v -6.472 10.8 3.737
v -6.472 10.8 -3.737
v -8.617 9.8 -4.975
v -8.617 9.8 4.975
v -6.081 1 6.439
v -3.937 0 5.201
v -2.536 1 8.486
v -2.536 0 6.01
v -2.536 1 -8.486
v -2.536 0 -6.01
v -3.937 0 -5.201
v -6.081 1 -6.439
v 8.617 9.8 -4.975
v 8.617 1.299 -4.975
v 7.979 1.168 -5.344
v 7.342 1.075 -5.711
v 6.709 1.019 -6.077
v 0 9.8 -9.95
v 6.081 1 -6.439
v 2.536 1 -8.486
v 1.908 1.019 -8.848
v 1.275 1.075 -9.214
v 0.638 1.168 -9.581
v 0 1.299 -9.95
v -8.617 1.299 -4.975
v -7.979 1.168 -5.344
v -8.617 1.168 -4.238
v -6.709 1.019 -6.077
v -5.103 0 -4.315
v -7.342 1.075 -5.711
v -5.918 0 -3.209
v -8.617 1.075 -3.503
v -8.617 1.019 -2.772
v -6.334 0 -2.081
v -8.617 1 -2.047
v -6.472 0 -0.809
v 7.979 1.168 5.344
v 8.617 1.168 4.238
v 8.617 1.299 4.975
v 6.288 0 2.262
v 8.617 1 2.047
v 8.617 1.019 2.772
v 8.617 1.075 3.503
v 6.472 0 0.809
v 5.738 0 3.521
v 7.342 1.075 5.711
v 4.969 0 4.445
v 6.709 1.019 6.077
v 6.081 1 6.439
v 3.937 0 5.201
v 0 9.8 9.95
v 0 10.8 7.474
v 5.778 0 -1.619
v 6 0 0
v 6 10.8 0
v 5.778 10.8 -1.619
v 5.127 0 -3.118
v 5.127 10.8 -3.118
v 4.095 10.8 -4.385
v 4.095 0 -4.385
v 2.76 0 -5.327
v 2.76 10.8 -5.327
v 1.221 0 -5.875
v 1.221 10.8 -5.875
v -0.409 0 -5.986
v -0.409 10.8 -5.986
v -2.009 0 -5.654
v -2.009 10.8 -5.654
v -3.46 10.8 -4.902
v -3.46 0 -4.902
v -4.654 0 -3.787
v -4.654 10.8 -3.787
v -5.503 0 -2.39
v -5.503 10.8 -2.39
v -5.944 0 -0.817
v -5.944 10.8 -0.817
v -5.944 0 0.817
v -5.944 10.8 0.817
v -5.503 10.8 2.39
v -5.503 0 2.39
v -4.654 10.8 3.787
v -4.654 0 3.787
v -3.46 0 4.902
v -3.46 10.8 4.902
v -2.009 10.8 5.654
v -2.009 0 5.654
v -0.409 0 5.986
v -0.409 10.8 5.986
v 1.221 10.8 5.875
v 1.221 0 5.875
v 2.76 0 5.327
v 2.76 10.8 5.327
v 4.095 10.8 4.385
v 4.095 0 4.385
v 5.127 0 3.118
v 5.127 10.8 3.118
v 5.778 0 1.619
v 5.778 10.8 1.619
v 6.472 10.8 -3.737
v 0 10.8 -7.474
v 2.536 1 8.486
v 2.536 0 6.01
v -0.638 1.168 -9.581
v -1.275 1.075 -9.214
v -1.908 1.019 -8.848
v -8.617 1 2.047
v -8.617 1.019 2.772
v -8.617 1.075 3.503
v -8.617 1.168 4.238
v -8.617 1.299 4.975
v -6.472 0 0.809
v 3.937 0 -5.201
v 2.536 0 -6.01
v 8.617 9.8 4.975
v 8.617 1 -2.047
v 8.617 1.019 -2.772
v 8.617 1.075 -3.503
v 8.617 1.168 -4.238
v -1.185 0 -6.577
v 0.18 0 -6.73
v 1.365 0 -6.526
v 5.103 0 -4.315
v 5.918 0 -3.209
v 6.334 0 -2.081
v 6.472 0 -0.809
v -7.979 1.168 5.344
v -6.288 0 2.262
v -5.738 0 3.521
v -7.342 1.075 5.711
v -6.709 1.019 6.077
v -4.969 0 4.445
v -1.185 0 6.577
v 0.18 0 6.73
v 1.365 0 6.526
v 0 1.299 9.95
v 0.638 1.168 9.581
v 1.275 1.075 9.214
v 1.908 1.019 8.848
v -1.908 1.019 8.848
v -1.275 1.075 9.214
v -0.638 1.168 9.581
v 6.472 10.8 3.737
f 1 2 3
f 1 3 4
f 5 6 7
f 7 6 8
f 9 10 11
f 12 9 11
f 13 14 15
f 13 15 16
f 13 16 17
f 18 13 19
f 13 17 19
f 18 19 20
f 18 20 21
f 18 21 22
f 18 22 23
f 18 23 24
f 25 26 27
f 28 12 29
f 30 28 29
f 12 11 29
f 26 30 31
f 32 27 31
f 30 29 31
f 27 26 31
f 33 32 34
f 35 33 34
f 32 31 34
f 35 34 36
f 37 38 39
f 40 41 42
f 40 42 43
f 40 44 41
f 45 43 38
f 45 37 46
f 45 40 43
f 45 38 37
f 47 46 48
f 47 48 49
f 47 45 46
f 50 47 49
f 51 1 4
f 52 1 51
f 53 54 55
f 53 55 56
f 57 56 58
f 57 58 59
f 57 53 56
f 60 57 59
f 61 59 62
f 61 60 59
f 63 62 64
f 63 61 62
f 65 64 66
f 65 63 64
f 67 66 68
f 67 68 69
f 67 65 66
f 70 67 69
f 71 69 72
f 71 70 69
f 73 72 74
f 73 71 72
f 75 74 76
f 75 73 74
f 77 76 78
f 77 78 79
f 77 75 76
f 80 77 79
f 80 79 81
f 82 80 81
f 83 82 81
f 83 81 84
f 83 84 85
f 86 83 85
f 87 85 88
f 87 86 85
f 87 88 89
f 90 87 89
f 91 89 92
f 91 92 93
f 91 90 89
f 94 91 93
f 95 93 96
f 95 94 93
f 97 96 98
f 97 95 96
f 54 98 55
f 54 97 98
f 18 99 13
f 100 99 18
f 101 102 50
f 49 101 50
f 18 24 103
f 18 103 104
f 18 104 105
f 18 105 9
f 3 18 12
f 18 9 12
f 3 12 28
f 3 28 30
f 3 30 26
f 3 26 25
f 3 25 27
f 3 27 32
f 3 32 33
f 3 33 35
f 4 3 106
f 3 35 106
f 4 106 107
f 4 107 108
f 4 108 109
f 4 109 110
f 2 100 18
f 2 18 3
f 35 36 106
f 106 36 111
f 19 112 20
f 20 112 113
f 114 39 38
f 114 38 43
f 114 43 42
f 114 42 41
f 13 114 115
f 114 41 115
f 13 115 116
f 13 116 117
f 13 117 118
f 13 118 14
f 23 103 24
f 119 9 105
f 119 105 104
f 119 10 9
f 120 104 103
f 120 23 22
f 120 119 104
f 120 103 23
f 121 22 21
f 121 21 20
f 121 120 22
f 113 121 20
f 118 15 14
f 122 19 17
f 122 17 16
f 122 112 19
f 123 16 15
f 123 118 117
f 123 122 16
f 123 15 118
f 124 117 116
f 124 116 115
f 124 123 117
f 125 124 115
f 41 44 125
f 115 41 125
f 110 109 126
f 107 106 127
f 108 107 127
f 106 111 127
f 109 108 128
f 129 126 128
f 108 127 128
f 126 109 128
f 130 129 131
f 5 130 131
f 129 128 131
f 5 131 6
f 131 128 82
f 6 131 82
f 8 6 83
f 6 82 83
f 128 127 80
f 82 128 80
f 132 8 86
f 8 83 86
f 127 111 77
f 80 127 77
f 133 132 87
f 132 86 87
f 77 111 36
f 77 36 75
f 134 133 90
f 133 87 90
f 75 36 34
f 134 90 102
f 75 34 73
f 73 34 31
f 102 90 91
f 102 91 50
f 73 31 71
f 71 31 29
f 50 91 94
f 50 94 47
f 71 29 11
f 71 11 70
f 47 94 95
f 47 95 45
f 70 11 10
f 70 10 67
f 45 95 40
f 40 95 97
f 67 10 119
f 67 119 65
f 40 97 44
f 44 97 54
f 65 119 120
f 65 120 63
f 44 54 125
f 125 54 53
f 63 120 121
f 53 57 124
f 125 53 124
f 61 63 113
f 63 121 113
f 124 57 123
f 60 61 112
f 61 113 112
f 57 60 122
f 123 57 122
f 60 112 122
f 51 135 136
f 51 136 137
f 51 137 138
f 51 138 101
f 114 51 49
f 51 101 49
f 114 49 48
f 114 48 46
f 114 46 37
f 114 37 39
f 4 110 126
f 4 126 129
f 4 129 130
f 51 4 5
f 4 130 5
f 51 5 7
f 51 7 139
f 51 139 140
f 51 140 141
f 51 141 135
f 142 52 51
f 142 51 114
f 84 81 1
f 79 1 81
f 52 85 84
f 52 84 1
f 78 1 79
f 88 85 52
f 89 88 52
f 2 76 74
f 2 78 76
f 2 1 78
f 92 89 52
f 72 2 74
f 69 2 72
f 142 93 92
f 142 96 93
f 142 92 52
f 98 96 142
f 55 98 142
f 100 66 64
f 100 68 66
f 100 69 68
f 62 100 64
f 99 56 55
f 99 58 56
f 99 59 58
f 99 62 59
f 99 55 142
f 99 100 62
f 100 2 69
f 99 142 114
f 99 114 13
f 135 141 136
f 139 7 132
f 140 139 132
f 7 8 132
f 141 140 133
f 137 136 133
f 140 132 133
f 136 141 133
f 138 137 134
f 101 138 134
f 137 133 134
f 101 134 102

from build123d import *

# Parameters (mm, degrees)
SKETCH_1_R             = 6
EXTRUDE_1_DEPTH        = 10.8
CHAMFER_1_SIZE         = 1
CHAMFER_1_SIZE2        = 2.144506921
CHAMFER_1_PART_2_SIZE  = 1
CHAMFER_1_PART_2_SIZE2 = 2.144506921
CHAMFER_1_PART_3_SIZE  = 1
CHAMFER_1_PART_3_SIZE2 = 2.144506921
CHAMFER_1_PART_4_SIZE  = 1
CHAMFER_1_PART_4_SIZE2 = 2.144506921
CHAMFER_1_PART_5_SIZE  = 1
CHAMFER_1_PART_5_SIZE2 = 2.144506921
CHAMFER_1_PART_6_SIZE  = 1
CHAMFER_1_PART_6_SIZE2 = 2.144506921
CHAMFER_2_SIZE         = 1
CHAMFER_2_SIZE2        = 2.144506921
CHAMFER_2_PART_2_SIZE  = 1
CHAMFER_2_PART_2_SIZE2 = 2.144506921
CHAMFER_2_PART_3_SIZE  = 1
CHAMFER_2_PART_3_SIZE2 = 2.144506921
CHAMFER_2_PART_4_SIZE  = 1
CHAMFER_2_PART_4_SIZE2 = 2.144506921
CHAMFER_2_PART_5_SIZE  = 1
CHAMFER_2_PART_5_SIZE2 = 2.144506921
CHAMFER_2_PART_6_SIZE  = 1
CHAMFER_2_PART_6_SIZE2 = 2.144506921
FILLET_2_R             = 12


with BuildPart() as part:
    # Эскиз1 → Бобышка-Вытянуть1 (new body)
    with BuildSketch(Plane(origin=(0, 0, 0), x_dir=(1, 0, 0), z_dir=(0, 1, 0))):
        Polygon((0, 9.95), (-8.616952768, 4.975), (-8.616952768, -4.975), (0, -9.95), (8.616952768, -4.975), (8.616952768, 4.975), align=None)
        Circle(SKETCH_1_R, mode=Mode.SUBTRACT)
    extrude(amount=EXTRUDE_1_DEPTH)

    # Фаска1
    chamfer_1_edges = [part.edges().sort_by_distance(p)[0] for p in [
        (-8.616952768, 10.8, 0),
    ]]
    chamfer_1_side = [part.faces().sort_by_distance(p)[0] for p in [
        (-8.616952768, 5.4, 0),
    ]]
    chamfer(chamfer_1_edges, length=CHAMFER_1_SIZE, length2=CHAMFER_1_SIZE2, reference=chamfer_1_side[0])

    # Фаска1 part 2
    chamfer_1_part_2_edges = [part.edges().sort_by_distance(p)[0] for p in [
        (-4.308476384, 10.8, 7.4625),
    ]]
    chamfer_1_part_2_side = [part.faces().sort_by_distance(p)[0] for p in [
        (-4.308476384, 5.4, 7.4625),
    ]]
    chamfer(chamfer_1_part_2_edges, length=CHAMFER_1_PART_2_SIZE, length2=CHAMFER_1_PART_2_SIZE2, reference=chamfer_1_part_2_side[0])

    # Фаска1 part 3
    chamfer_1_part_3_edges = [part.edges().sort_by_distance(p)[0] for p in [
        (4.308476384, 10.8, 7.4625),
    ]]
    chamfer_1_part_3_side = [part.faces().sort_by_distance(p)[0] for p in [
        (4.308476384, 5.4, 7.4625),
    ]]
    chamfer(chamfer_1_part_3_edges, length=CHAMFER_1_PART_3_SIZE, length2=CHAMFER_1_PART_3_SIZE2, reference=chamfer_1_part_3_side[0])

    # Фаска1 part 4
    chamfer_1_part_4_edges = [part.edges().sort_by_distance(p)[0] for p in [
        (8.616952768, 10.8, 0),
    ]]
    chamfer_1_part_4_side = [part.faces().sort_by_distance(p)[0] for p in [
        (8.616952768, 5.4, 0),
    ]]
    chamfer(chamfer_1_part_4_edges, length=CHAMFER_1_PART_4_SIZE, length2=CHAMFER_1_PART_4_SIZE2, reference=chamfer_1_part_4_side[0])

    # Фаска1 part 5
    chamfer_1_part_5_edges = [part.edges().sort_by_distance(p)[0] for p in [
        (4.308476384, 10.8, -7.4625),
    ]]
    chamfer_1_part_5_side = [part.faces().sort_by_distance(p)[0] for p in [
        (4.308476384, 5.4, -7.4625),
    ]]
    chamfer(chamfer_1_part_5_edges, length=CHAMFER_1_PART_5_SIZE, length2=CHAMFER_1_PART_5_SIZE2, reference=chamfer_1_part_5_side[0])

    # Фаска1 part 6
    chamfer_1_part_6_edges = [part.edges().sort_by_distance(p)[0] for p in [
        (-4.308476384, 10.8, -7.4625),
    ]]
    chamfer_1_part_6_side = [part.faces().sort_by_distance(p)[0] for p in [
        (-4.308476384, 5.4, -7.4625),
    ]]
    chamfer(chamfer_1_part_6_edges, length=CHAMFER_1_PART_6_SIZE, length2=CHAMFER_1_PART_6_SIZE2, reference=chamfer_1_part_6_side[0])

    # Фаска2
    chamfer_2_edges = [part.edges().sort_by_distance(p)[0] for p in [
        (8.616952768, 0, 0),
    ]]
    chamfer_2_side = [part.faces().sort_by_distance(p)[0] for p in [
        (8.616952768, 4.9, 0),
    ]]
    chamfer(chamfer_2_edges, length=CHAMFER_2_SIZE, length2=CHAMFER_2_SIZE2, reference=chamfer_2_side[0])

    # Фаска2 part 2
    chamfer_2_part_2_edges = [part.edges().sort_by_distance(p)[0] for p in [
        (4.308476384, 0, 7.4625),
    ]]
    chamfer_2_part_2_side = [part.faces().sort_by_distance(p)[0] for p in [
        (4.308476384, 4.9, 7.4625),
    ]]
    chamfer(chamfer_2_part_2_edges, length=CHAMFER_2_PART_2_SIZE, length2=CHAMFER_2_PART_2_SIZE2, reference=chamfer_2_part_2_side[0])

    # Фаска2 part 3
    chamfer_2_part_3_edges = [part.edges().sort_by_distance(p)[0] for p in [
        (-4.308476384, 0, 7.4625),
    ]]
    chamfer_2_part_3_side = [part.faces().sort_by_distance(p)[0] for p in [
        (-4.308476384, 4.9, 7.4625),
    ]]
    chamfer(chamfer_2_part_3_edges, length=CHAMFER_2_PART_3_SIZE, length2=CHAMFER_2_PART_3_SIZE2, reference=chamfer_2_part_3_side[0])

    # Фаска2 part 4
    chamfer_2_part_4_edges = [part.edges().sort_by_distance(p)[0] for p in [
        (-8.616952768, 0, 0),
    ]]
    chamfer_2_part_4_side = [part.faces().sort_by_distance(p)[0] for p in [
        (-8.616952768, 4.9, 0),
    ]]
    chamfer(chamfer_2_part_4_edges, length=CHAMFER_2_PART_4_SIZE, length2=CHAMFER_2_PART_4_SIZE2, reference=chamfer_2_part_4_side[0])

    # Фаска2 part 5
    chamfer_2_part_5_edges = [part.edges().sort_by_distance(p)[0] for p in [
        (-4.308476384, 0, -7.4625),
    ]]
    chamfer_2_part_5_side = [part.faces().sort_by_distance(p)[0] for p in [
        (-4.308476384, 4.9, -7.4625),
    ]]
    chamfer(chamfer_2_part_5_edges, length=CHAMFER_2_PART_5_SIZE, length2=CHAMFER_2_PART_5_SIZE2, reference=chamfer_2_part_5_side[0])

    # Фаска2 part 6
    chamfer_2_part_6_edges = [part.edges().sort_by_distance(p)[0] for p in [
        (4.308476384, 0, -7.4625),
    ]]
    chamfer_2_part_6_side = [part.faces().sort_by_distance(p)[0] for p in [
        (4.308476384, 4.9, -7.4625),
    ]]
    chamfer(chamfer_2_part_6_edges, length=CHAMFER_2_PART_6_SIZE, length2=CHAMFER_2_PART_6_SIZE2, reference=chamfer_2_part_6_side[0])

    # Скругление2
    fillet_2_edges = [part.edges().sort_by_distance(p)[0] for p in [
        (7.544699307, 0.5, 4.355934176),
        (0, 0.5, 8.711868352),
        (7.544699307, 0.5, -4.355934176),
        (-7.544699307, 0.5, 4.355934176),
        (0, 0.5, -8.711868352),
        (-7.544699307, 0.5, -4.355934176),
    ]]
    fillet(fillet_2_edges, radius=FILLET_2_R)


solid = part.part
